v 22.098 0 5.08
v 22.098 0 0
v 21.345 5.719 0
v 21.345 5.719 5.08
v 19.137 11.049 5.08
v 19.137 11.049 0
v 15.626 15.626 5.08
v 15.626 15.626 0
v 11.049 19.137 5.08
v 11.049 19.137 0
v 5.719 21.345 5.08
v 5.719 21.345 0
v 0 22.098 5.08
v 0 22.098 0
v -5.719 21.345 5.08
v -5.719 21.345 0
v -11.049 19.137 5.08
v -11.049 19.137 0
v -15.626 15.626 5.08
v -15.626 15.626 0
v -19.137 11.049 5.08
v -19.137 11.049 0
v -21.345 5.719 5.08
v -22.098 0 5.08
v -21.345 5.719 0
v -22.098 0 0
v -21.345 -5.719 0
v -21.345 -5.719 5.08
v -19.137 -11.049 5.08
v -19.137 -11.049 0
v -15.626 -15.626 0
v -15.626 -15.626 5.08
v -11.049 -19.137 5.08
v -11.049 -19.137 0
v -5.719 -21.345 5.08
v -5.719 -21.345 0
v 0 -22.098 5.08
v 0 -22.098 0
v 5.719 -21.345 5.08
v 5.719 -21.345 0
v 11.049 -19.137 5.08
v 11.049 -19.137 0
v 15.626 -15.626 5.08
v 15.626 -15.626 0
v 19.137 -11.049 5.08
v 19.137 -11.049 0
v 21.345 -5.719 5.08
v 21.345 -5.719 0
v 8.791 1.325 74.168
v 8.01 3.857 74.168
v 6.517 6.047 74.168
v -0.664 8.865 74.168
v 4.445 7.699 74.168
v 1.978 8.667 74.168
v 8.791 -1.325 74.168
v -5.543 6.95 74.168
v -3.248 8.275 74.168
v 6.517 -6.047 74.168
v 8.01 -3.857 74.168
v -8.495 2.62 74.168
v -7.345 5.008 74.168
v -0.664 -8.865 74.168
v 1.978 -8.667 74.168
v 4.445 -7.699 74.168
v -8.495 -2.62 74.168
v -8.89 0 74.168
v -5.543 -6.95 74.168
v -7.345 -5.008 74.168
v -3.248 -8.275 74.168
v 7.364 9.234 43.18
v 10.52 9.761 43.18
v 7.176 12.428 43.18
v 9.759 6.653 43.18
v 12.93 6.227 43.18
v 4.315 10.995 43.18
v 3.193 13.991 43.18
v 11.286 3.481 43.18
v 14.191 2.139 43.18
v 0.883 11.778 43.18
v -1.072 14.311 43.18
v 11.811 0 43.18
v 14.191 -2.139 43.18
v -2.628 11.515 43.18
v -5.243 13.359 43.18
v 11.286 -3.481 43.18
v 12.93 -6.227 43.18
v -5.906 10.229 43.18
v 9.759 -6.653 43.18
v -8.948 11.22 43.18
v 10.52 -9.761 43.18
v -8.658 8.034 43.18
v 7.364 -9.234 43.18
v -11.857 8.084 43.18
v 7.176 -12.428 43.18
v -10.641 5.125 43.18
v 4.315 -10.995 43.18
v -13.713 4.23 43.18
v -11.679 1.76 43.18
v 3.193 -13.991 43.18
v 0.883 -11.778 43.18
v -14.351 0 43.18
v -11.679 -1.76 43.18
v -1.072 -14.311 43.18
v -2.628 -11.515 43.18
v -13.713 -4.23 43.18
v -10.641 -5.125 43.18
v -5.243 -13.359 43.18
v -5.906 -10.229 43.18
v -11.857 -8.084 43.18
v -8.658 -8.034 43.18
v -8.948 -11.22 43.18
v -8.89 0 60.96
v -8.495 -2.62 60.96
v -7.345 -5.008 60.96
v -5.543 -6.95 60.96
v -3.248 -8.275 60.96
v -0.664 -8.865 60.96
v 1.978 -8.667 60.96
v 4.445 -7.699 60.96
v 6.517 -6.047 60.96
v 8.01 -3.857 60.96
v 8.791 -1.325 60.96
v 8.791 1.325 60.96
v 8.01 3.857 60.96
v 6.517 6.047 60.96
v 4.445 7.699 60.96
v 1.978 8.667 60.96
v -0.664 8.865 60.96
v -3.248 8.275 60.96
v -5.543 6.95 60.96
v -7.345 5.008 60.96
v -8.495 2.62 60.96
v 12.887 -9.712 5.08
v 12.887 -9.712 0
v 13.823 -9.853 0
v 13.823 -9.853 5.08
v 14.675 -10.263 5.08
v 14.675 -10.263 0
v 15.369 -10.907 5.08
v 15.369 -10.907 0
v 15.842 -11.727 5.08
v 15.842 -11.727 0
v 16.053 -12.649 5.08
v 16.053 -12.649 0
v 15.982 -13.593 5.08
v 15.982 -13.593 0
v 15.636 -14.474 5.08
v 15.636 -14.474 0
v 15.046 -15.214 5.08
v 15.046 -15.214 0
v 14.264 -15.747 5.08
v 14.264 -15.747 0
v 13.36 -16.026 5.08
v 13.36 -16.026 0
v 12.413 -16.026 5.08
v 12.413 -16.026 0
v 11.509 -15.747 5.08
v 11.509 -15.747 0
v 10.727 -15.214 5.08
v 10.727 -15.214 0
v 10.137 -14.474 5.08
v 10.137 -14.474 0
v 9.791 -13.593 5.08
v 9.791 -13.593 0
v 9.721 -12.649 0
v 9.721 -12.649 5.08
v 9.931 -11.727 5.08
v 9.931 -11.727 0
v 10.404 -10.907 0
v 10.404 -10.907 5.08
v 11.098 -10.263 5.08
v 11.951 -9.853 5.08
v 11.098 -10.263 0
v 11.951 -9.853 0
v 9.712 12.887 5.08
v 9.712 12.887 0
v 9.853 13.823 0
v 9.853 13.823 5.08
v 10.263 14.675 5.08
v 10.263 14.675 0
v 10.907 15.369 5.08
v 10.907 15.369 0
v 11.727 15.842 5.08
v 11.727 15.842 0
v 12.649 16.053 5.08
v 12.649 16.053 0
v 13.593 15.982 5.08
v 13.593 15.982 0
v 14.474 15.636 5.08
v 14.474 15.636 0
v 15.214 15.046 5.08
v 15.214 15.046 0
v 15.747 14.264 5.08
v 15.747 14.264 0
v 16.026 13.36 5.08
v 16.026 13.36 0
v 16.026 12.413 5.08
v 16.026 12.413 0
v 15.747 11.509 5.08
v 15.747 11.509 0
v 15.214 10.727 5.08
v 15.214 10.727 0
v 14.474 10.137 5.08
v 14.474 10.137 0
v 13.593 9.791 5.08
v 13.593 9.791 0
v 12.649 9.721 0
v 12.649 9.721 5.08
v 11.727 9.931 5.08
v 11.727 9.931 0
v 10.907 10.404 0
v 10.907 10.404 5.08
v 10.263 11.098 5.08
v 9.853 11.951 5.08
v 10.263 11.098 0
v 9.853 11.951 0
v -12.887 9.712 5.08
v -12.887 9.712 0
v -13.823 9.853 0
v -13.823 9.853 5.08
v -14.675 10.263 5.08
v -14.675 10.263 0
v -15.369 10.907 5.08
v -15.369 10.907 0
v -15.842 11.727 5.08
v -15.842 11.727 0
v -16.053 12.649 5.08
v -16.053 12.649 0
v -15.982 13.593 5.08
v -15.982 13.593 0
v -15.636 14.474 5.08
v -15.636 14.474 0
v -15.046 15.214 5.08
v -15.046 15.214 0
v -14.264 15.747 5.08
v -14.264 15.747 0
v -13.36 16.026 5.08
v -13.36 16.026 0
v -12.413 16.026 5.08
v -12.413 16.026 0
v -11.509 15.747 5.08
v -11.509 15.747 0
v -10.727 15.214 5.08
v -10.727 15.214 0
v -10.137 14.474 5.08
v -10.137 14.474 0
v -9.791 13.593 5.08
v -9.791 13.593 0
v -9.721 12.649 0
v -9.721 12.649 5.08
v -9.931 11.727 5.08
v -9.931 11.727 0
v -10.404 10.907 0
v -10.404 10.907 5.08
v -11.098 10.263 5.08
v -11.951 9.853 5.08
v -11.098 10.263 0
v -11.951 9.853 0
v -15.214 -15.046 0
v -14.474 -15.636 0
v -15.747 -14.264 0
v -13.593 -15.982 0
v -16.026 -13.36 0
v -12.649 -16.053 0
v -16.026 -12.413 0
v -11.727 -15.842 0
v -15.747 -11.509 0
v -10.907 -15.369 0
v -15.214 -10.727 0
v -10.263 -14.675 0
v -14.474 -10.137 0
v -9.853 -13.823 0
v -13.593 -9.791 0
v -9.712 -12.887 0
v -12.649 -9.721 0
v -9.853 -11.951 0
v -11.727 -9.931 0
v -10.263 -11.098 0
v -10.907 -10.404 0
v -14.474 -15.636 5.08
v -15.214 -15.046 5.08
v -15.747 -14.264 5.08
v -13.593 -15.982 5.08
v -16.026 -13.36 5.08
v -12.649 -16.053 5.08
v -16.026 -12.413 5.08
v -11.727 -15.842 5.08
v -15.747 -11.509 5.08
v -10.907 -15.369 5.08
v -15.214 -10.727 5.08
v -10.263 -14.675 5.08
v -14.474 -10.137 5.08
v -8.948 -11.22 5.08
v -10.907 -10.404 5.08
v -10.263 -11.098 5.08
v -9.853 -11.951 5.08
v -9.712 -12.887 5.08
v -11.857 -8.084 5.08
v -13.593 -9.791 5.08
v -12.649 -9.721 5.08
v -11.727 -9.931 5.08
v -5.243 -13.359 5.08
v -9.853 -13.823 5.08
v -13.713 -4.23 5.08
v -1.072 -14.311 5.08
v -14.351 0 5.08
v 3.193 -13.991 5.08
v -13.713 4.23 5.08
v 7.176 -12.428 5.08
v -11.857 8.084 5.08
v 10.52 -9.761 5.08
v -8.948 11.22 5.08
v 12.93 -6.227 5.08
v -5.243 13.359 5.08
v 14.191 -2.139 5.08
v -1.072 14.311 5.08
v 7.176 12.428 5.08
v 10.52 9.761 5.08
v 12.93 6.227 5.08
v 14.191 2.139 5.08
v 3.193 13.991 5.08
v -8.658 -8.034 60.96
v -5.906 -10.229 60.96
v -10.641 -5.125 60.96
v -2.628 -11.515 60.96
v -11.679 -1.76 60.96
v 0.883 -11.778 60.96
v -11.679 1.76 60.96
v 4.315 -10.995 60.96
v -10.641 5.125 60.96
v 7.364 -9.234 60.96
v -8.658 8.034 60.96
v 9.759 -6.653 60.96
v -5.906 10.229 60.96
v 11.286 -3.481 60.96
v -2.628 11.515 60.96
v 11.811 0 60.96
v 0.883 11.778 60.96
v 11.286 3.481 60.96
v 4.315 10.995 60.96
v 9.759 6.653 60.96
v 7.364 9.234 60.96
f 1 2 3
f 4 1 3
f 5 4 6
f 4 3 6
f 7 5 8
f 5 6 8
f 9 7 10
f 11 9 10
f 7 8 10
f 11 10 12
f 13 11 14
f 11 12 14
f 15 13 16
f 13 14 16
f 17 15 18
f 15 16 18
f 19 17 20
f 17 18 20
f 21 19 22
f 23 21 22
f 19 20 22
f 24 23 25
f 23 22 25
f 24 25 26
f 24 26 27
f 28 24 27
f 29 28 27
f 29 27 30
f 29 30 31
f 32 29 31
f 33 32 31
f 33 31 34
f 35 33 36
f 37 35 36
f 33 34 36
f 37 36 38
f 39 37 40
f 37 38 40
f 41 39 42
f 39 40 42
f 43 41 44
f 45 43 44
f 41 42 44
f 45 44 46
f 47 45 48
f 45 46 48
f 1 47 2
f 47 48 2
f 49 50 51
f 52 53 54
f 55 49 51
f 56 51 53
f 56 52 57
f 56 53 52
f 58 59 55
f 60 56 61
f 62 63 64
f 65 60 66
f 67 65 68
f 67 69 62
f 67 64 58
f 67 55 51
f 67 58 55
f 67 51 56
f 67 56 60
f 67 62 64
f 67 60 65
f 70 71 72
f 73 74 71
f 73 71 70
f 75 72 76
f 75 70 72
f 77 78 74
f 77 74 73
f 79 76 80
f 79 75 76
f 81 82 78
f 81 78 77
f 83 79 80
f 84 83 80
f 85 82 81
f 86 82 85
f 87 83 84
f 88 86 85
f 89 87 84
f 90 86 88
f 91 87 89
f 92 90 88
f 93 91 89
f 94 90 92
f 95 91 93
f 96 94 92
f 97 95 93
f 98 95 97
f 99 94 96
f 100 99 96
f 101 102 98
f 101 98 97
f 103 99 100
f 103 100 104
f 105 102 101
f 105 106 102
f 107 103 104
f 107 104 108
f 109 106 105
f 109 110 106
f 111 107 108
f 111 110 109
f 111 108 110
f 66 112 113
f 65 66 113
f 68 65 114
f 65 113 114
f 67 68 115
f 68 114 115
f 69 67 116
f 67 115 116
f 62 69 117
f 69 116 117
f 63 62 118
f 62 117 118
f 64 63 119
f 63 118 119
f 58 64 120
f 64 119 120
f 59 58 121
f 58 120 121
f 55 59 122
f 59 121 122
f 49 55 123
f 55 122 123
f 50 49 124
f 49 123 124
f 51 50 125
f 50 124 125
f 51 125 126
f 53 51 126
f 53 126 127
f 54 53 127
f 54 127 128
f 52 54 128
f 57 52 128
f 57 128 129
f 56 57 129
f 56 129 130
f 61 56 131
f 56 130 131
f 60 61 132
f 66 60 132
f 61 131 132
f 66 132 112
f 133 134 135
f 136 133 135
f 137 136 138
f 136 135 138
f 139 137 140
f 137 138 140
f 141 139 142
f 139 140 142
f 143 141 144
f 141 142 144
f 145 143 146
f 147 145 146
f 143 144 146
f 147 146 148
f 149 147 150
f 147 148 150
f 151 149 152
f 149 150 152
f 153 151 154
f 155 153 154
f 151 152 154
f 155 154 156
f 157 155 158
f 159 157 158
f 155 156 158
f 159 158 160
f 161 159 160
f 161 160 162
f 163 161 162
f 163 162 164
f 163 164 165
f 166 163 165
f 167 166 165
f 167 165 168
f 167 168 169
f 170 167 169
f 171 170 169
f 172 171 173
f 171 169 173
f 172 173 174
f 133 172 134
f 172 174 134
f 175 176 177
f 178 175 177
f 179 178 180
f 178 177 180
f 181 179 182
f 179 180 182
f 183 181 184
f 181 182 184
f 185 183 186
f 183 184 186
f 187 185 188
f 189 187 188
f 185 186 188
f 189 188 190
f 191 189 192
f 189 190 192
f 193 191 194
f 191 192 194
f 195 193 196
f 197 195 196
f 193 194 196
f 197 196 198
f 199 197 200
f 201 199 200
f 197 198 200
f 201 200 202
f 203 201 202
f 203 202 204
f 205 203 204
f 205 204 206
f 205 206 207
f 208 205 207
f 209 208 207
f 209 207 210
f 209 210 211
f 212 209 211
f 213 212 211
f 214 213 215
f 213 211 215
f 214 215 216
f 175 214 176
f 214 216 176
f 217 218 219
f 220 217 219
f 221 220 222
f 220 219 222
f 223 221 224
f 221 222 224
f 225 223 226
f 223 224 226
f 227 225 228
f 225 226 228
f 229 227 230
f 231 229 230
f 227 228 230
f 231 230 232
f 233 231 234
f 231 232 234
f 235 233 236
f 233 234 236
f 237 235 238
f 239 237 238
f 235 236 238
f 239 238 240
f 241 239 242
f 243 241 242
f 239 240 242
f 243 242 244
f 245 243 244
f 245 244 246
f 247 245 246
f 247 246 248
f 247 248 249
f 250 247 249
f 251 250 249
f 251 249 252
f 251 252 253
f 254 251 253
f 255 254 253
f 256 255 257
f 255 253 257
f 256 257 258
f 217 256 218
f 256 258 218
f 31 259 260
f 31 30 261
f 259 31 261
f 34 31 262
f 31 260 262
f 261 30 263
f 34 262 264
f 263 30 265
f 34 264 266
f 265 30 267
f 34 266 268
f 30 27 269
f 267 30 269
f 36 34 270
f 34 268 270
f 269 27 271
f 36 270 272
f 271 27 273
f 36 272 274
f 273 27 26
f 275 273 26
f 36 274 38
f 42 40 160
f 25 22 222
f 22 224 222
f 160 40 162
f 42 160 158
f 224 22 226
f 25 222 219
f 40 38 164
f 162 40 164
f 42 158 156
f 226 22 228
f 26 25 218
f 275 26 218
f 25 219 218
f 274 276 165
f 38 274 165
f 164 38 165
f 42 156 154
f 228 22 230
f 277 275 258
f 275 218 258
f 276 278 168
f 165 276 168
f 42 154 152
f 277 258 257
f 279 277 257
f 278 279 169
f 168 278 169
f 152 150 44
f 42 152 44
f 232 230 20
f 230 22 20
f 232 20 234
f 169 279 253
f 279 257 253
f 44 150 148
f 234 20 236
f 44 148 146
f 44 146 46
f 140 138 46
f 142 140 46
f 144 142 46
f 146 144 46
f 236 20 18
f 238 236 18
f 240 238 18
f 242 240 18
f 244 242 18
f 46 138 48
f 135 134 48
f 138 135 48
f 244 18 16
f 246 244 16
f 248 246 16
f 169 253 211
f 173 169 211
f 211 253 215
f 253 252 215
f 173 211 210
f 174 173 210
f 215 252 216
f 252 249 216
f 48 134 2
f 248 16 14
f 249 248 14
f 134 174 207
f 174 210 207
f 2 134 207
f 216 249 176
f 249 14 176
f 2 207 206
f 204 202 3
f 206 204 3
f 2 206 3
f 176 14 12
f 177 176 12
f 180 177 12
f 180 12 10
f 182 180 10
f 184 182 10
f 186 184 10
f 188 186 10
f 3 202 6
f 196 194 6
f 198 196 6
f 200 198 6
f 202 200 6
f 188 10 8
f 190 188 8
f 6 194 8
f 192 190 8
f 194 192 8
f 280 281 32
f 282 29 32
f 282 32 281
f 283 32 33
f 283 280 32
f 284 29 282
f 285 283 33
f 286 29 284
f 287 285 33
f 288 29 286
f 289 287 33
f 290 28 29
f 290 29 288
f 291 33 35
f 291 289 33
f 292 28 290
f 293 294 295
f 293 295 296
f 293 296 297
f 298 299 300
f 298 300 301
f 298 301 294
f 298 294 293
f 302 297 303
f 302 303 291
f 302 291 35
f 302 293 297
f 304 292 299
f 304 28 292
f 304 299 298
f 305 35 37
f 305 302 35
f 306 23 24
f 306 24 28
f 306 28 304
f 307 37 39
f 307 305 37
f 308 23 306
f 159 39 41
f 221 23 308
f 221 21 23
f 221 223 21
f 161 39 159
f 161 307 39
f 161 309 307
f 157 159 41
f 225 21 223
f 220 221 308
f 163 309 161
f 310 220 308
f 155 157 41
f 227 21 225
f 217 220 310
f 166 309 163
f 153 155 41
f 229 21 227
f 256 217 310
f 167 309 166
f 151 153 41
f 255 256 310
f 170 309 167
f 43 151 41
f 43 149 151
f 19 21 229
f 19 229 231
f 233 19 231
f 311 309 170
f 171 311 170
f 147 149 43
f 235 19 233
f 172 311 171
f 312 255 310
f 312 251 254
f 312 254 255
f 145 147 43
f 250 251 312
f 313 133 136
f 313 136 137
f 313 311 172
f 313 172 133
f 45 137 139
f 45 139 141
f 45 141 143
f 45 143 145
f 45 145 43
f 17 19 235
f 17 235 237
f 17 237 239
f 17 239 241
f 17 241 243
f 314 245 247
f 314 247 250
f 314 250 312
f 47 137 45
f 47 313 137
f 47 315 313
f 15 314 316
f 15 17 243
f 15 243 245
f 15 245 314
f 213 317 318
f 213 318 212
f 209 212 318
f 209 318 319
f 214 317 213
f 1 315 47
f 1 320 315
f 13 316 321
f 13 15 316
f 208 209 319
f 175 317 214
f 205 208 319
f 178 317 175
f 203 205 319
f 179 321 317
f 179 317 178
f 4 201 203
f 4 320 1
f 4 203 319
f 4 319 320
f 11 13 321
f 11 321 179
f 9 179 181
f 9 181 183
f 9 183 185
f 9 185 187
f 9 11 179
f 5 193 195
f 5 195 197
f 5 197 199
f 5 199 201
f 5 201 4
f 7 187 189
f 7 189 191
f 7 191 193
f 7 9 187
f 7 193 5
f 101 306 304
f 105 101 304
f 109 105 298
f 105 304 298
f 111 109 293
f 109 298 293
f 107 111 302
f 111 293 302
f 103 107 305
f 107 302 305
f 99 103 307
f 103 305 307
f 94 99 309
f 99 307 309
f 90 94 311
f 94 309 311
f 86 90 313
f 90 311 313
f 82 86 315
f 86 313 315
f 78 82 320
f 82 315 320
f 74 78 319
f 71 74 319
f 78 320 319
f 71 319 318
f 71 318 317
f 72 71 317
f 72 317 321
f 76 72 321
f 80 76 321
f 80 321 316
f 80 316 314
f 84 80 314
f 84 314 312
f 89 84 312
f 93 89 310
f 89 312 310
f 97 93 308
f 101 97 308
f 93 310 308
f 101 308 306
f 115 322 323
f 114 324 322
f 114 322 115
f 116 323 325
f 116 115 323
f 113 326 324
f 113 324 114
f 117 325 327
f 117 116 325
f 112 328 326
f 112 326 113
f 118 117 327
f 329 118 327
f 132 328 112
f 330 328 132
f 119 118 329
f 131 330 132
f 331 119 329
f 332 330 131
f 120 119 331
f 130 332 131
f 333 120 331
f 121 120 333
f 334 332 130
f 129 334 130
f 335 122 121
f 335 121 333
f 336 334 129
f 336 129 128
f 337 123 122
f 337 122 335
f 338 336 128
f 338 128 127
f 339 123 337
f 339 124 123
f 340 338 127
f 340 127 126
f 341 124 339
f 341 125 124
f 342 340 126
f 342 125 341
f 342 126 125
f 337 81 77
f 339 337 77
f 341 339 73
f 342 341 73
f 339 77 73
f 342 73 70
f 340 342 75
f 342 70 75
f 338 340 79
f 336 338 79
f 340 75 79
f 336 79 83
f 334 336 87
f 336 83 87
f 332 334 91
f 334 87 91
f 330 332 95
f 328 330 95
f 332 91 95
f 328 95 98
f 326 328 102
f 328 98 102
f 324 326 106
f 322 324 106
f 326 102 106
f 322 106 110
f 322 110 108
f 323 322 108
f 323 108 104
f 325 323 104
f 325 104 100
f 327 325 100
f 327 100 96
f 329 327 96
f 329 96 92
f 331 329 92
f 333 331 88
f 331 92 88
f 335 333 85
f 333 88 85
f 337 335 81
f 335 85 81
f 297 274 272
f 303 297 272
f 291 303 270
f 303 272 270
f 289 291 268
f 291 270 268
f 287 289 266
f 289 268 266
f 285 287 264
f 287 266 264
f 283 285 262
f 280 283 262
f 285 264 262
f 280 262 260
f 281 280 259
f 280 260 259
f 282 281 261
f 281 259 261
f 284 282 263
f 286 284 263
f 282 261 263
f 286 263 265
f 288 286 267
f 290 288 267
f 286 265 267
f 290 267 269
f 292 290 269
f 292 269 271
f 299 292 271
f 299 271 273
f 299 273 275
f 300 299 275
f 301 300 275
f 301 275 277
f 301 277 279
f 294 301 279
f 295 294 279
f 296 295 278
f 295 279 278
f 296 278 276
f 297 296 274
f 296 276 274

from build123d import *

# Parameters (mm, degrees)
SKETCH1_R           = 22.098
BOSS_EXTRUDE1_DEPTH = 5.08
SKETCH2_R           = 14.351
BOSS_EXTRUDE2_DEPTH = 38.1
SKETCH3_R           = 11.811
BOSS_EXTRUDE3_DEPTH = 17.78
SKETCH4_R           = 8.89
BOSS_EXTRUDE4_DEPTH = 13.208
SKETCH6_R           = 3.175
CUT_EXTRUDE1_DEPTH  = 5.08
CIRPATTERN1_COUNT   = 4


with BuildPart() as part:
    # Sketch1 → Boss-Extrude1 (new body)
    with BuildSketch(Plane.XY):
        Circle(SKETCH1_R)
    extrude(amount=BOSS_EXTRUDE1_DEPTH)

    # Sketch2 → Boss-Extrude2 (add)
    with BuildSketch(Plane.XY.offset(5.08)):
        with Locations(Location((0, 0, 0), (0, 0, 180))):
            Circle(SKETCH2_R)
    extrude(amount=BOSS_EXTRUDE2_DEPTH)

    # Sketch3 → Boss-Extrude3 (add)
    with BuildSketch(Plane.XY.offset(43.18)):
        Circle(SKETCH3_R)
    extrude(amount=BOSS_EXTRUDE3_DEPTH)

    # Sketch4 → Boss-Extrude4 (add)
    with BuildSketch(Plane.XY.offset(60.96)):
        with Locations(Location((0, 0, 0), (0, 0, 180))):
            Circle(SKETCH4_R)
    extrude(amount=BOSS_EXTRUDE4_DEPTH)

    # Sketch6 → Cut-Extrude1 (cut)
    with BuildSketch(Plane(origin=(0, 0, 0), x_dir=(-1, 0, 0), z_dir=(0, 0, -1))):
        with Locations((-12.886667534, 12.886667534)):
            Circle(SKETCH6_R)
    cut_extrude1 = extrude(amount=-CUT_EXTRUDE1_DEPTH, mode=Mode.SUBTRACT)

    # CirPattern1: Cut-Extrude1 ×4 about axis
    cirpattern1_axis = Axis((0, 0, 0), (0, 0, 1))
    for i in range(1, CIRPATTERN1_COUNT):
        add(cut_extrude1.rotate(cirpattern1_axis, i * 360 / CIRPATTERN1_COUNT), mode=Mode.SUBTRACT)


solid = part.part
